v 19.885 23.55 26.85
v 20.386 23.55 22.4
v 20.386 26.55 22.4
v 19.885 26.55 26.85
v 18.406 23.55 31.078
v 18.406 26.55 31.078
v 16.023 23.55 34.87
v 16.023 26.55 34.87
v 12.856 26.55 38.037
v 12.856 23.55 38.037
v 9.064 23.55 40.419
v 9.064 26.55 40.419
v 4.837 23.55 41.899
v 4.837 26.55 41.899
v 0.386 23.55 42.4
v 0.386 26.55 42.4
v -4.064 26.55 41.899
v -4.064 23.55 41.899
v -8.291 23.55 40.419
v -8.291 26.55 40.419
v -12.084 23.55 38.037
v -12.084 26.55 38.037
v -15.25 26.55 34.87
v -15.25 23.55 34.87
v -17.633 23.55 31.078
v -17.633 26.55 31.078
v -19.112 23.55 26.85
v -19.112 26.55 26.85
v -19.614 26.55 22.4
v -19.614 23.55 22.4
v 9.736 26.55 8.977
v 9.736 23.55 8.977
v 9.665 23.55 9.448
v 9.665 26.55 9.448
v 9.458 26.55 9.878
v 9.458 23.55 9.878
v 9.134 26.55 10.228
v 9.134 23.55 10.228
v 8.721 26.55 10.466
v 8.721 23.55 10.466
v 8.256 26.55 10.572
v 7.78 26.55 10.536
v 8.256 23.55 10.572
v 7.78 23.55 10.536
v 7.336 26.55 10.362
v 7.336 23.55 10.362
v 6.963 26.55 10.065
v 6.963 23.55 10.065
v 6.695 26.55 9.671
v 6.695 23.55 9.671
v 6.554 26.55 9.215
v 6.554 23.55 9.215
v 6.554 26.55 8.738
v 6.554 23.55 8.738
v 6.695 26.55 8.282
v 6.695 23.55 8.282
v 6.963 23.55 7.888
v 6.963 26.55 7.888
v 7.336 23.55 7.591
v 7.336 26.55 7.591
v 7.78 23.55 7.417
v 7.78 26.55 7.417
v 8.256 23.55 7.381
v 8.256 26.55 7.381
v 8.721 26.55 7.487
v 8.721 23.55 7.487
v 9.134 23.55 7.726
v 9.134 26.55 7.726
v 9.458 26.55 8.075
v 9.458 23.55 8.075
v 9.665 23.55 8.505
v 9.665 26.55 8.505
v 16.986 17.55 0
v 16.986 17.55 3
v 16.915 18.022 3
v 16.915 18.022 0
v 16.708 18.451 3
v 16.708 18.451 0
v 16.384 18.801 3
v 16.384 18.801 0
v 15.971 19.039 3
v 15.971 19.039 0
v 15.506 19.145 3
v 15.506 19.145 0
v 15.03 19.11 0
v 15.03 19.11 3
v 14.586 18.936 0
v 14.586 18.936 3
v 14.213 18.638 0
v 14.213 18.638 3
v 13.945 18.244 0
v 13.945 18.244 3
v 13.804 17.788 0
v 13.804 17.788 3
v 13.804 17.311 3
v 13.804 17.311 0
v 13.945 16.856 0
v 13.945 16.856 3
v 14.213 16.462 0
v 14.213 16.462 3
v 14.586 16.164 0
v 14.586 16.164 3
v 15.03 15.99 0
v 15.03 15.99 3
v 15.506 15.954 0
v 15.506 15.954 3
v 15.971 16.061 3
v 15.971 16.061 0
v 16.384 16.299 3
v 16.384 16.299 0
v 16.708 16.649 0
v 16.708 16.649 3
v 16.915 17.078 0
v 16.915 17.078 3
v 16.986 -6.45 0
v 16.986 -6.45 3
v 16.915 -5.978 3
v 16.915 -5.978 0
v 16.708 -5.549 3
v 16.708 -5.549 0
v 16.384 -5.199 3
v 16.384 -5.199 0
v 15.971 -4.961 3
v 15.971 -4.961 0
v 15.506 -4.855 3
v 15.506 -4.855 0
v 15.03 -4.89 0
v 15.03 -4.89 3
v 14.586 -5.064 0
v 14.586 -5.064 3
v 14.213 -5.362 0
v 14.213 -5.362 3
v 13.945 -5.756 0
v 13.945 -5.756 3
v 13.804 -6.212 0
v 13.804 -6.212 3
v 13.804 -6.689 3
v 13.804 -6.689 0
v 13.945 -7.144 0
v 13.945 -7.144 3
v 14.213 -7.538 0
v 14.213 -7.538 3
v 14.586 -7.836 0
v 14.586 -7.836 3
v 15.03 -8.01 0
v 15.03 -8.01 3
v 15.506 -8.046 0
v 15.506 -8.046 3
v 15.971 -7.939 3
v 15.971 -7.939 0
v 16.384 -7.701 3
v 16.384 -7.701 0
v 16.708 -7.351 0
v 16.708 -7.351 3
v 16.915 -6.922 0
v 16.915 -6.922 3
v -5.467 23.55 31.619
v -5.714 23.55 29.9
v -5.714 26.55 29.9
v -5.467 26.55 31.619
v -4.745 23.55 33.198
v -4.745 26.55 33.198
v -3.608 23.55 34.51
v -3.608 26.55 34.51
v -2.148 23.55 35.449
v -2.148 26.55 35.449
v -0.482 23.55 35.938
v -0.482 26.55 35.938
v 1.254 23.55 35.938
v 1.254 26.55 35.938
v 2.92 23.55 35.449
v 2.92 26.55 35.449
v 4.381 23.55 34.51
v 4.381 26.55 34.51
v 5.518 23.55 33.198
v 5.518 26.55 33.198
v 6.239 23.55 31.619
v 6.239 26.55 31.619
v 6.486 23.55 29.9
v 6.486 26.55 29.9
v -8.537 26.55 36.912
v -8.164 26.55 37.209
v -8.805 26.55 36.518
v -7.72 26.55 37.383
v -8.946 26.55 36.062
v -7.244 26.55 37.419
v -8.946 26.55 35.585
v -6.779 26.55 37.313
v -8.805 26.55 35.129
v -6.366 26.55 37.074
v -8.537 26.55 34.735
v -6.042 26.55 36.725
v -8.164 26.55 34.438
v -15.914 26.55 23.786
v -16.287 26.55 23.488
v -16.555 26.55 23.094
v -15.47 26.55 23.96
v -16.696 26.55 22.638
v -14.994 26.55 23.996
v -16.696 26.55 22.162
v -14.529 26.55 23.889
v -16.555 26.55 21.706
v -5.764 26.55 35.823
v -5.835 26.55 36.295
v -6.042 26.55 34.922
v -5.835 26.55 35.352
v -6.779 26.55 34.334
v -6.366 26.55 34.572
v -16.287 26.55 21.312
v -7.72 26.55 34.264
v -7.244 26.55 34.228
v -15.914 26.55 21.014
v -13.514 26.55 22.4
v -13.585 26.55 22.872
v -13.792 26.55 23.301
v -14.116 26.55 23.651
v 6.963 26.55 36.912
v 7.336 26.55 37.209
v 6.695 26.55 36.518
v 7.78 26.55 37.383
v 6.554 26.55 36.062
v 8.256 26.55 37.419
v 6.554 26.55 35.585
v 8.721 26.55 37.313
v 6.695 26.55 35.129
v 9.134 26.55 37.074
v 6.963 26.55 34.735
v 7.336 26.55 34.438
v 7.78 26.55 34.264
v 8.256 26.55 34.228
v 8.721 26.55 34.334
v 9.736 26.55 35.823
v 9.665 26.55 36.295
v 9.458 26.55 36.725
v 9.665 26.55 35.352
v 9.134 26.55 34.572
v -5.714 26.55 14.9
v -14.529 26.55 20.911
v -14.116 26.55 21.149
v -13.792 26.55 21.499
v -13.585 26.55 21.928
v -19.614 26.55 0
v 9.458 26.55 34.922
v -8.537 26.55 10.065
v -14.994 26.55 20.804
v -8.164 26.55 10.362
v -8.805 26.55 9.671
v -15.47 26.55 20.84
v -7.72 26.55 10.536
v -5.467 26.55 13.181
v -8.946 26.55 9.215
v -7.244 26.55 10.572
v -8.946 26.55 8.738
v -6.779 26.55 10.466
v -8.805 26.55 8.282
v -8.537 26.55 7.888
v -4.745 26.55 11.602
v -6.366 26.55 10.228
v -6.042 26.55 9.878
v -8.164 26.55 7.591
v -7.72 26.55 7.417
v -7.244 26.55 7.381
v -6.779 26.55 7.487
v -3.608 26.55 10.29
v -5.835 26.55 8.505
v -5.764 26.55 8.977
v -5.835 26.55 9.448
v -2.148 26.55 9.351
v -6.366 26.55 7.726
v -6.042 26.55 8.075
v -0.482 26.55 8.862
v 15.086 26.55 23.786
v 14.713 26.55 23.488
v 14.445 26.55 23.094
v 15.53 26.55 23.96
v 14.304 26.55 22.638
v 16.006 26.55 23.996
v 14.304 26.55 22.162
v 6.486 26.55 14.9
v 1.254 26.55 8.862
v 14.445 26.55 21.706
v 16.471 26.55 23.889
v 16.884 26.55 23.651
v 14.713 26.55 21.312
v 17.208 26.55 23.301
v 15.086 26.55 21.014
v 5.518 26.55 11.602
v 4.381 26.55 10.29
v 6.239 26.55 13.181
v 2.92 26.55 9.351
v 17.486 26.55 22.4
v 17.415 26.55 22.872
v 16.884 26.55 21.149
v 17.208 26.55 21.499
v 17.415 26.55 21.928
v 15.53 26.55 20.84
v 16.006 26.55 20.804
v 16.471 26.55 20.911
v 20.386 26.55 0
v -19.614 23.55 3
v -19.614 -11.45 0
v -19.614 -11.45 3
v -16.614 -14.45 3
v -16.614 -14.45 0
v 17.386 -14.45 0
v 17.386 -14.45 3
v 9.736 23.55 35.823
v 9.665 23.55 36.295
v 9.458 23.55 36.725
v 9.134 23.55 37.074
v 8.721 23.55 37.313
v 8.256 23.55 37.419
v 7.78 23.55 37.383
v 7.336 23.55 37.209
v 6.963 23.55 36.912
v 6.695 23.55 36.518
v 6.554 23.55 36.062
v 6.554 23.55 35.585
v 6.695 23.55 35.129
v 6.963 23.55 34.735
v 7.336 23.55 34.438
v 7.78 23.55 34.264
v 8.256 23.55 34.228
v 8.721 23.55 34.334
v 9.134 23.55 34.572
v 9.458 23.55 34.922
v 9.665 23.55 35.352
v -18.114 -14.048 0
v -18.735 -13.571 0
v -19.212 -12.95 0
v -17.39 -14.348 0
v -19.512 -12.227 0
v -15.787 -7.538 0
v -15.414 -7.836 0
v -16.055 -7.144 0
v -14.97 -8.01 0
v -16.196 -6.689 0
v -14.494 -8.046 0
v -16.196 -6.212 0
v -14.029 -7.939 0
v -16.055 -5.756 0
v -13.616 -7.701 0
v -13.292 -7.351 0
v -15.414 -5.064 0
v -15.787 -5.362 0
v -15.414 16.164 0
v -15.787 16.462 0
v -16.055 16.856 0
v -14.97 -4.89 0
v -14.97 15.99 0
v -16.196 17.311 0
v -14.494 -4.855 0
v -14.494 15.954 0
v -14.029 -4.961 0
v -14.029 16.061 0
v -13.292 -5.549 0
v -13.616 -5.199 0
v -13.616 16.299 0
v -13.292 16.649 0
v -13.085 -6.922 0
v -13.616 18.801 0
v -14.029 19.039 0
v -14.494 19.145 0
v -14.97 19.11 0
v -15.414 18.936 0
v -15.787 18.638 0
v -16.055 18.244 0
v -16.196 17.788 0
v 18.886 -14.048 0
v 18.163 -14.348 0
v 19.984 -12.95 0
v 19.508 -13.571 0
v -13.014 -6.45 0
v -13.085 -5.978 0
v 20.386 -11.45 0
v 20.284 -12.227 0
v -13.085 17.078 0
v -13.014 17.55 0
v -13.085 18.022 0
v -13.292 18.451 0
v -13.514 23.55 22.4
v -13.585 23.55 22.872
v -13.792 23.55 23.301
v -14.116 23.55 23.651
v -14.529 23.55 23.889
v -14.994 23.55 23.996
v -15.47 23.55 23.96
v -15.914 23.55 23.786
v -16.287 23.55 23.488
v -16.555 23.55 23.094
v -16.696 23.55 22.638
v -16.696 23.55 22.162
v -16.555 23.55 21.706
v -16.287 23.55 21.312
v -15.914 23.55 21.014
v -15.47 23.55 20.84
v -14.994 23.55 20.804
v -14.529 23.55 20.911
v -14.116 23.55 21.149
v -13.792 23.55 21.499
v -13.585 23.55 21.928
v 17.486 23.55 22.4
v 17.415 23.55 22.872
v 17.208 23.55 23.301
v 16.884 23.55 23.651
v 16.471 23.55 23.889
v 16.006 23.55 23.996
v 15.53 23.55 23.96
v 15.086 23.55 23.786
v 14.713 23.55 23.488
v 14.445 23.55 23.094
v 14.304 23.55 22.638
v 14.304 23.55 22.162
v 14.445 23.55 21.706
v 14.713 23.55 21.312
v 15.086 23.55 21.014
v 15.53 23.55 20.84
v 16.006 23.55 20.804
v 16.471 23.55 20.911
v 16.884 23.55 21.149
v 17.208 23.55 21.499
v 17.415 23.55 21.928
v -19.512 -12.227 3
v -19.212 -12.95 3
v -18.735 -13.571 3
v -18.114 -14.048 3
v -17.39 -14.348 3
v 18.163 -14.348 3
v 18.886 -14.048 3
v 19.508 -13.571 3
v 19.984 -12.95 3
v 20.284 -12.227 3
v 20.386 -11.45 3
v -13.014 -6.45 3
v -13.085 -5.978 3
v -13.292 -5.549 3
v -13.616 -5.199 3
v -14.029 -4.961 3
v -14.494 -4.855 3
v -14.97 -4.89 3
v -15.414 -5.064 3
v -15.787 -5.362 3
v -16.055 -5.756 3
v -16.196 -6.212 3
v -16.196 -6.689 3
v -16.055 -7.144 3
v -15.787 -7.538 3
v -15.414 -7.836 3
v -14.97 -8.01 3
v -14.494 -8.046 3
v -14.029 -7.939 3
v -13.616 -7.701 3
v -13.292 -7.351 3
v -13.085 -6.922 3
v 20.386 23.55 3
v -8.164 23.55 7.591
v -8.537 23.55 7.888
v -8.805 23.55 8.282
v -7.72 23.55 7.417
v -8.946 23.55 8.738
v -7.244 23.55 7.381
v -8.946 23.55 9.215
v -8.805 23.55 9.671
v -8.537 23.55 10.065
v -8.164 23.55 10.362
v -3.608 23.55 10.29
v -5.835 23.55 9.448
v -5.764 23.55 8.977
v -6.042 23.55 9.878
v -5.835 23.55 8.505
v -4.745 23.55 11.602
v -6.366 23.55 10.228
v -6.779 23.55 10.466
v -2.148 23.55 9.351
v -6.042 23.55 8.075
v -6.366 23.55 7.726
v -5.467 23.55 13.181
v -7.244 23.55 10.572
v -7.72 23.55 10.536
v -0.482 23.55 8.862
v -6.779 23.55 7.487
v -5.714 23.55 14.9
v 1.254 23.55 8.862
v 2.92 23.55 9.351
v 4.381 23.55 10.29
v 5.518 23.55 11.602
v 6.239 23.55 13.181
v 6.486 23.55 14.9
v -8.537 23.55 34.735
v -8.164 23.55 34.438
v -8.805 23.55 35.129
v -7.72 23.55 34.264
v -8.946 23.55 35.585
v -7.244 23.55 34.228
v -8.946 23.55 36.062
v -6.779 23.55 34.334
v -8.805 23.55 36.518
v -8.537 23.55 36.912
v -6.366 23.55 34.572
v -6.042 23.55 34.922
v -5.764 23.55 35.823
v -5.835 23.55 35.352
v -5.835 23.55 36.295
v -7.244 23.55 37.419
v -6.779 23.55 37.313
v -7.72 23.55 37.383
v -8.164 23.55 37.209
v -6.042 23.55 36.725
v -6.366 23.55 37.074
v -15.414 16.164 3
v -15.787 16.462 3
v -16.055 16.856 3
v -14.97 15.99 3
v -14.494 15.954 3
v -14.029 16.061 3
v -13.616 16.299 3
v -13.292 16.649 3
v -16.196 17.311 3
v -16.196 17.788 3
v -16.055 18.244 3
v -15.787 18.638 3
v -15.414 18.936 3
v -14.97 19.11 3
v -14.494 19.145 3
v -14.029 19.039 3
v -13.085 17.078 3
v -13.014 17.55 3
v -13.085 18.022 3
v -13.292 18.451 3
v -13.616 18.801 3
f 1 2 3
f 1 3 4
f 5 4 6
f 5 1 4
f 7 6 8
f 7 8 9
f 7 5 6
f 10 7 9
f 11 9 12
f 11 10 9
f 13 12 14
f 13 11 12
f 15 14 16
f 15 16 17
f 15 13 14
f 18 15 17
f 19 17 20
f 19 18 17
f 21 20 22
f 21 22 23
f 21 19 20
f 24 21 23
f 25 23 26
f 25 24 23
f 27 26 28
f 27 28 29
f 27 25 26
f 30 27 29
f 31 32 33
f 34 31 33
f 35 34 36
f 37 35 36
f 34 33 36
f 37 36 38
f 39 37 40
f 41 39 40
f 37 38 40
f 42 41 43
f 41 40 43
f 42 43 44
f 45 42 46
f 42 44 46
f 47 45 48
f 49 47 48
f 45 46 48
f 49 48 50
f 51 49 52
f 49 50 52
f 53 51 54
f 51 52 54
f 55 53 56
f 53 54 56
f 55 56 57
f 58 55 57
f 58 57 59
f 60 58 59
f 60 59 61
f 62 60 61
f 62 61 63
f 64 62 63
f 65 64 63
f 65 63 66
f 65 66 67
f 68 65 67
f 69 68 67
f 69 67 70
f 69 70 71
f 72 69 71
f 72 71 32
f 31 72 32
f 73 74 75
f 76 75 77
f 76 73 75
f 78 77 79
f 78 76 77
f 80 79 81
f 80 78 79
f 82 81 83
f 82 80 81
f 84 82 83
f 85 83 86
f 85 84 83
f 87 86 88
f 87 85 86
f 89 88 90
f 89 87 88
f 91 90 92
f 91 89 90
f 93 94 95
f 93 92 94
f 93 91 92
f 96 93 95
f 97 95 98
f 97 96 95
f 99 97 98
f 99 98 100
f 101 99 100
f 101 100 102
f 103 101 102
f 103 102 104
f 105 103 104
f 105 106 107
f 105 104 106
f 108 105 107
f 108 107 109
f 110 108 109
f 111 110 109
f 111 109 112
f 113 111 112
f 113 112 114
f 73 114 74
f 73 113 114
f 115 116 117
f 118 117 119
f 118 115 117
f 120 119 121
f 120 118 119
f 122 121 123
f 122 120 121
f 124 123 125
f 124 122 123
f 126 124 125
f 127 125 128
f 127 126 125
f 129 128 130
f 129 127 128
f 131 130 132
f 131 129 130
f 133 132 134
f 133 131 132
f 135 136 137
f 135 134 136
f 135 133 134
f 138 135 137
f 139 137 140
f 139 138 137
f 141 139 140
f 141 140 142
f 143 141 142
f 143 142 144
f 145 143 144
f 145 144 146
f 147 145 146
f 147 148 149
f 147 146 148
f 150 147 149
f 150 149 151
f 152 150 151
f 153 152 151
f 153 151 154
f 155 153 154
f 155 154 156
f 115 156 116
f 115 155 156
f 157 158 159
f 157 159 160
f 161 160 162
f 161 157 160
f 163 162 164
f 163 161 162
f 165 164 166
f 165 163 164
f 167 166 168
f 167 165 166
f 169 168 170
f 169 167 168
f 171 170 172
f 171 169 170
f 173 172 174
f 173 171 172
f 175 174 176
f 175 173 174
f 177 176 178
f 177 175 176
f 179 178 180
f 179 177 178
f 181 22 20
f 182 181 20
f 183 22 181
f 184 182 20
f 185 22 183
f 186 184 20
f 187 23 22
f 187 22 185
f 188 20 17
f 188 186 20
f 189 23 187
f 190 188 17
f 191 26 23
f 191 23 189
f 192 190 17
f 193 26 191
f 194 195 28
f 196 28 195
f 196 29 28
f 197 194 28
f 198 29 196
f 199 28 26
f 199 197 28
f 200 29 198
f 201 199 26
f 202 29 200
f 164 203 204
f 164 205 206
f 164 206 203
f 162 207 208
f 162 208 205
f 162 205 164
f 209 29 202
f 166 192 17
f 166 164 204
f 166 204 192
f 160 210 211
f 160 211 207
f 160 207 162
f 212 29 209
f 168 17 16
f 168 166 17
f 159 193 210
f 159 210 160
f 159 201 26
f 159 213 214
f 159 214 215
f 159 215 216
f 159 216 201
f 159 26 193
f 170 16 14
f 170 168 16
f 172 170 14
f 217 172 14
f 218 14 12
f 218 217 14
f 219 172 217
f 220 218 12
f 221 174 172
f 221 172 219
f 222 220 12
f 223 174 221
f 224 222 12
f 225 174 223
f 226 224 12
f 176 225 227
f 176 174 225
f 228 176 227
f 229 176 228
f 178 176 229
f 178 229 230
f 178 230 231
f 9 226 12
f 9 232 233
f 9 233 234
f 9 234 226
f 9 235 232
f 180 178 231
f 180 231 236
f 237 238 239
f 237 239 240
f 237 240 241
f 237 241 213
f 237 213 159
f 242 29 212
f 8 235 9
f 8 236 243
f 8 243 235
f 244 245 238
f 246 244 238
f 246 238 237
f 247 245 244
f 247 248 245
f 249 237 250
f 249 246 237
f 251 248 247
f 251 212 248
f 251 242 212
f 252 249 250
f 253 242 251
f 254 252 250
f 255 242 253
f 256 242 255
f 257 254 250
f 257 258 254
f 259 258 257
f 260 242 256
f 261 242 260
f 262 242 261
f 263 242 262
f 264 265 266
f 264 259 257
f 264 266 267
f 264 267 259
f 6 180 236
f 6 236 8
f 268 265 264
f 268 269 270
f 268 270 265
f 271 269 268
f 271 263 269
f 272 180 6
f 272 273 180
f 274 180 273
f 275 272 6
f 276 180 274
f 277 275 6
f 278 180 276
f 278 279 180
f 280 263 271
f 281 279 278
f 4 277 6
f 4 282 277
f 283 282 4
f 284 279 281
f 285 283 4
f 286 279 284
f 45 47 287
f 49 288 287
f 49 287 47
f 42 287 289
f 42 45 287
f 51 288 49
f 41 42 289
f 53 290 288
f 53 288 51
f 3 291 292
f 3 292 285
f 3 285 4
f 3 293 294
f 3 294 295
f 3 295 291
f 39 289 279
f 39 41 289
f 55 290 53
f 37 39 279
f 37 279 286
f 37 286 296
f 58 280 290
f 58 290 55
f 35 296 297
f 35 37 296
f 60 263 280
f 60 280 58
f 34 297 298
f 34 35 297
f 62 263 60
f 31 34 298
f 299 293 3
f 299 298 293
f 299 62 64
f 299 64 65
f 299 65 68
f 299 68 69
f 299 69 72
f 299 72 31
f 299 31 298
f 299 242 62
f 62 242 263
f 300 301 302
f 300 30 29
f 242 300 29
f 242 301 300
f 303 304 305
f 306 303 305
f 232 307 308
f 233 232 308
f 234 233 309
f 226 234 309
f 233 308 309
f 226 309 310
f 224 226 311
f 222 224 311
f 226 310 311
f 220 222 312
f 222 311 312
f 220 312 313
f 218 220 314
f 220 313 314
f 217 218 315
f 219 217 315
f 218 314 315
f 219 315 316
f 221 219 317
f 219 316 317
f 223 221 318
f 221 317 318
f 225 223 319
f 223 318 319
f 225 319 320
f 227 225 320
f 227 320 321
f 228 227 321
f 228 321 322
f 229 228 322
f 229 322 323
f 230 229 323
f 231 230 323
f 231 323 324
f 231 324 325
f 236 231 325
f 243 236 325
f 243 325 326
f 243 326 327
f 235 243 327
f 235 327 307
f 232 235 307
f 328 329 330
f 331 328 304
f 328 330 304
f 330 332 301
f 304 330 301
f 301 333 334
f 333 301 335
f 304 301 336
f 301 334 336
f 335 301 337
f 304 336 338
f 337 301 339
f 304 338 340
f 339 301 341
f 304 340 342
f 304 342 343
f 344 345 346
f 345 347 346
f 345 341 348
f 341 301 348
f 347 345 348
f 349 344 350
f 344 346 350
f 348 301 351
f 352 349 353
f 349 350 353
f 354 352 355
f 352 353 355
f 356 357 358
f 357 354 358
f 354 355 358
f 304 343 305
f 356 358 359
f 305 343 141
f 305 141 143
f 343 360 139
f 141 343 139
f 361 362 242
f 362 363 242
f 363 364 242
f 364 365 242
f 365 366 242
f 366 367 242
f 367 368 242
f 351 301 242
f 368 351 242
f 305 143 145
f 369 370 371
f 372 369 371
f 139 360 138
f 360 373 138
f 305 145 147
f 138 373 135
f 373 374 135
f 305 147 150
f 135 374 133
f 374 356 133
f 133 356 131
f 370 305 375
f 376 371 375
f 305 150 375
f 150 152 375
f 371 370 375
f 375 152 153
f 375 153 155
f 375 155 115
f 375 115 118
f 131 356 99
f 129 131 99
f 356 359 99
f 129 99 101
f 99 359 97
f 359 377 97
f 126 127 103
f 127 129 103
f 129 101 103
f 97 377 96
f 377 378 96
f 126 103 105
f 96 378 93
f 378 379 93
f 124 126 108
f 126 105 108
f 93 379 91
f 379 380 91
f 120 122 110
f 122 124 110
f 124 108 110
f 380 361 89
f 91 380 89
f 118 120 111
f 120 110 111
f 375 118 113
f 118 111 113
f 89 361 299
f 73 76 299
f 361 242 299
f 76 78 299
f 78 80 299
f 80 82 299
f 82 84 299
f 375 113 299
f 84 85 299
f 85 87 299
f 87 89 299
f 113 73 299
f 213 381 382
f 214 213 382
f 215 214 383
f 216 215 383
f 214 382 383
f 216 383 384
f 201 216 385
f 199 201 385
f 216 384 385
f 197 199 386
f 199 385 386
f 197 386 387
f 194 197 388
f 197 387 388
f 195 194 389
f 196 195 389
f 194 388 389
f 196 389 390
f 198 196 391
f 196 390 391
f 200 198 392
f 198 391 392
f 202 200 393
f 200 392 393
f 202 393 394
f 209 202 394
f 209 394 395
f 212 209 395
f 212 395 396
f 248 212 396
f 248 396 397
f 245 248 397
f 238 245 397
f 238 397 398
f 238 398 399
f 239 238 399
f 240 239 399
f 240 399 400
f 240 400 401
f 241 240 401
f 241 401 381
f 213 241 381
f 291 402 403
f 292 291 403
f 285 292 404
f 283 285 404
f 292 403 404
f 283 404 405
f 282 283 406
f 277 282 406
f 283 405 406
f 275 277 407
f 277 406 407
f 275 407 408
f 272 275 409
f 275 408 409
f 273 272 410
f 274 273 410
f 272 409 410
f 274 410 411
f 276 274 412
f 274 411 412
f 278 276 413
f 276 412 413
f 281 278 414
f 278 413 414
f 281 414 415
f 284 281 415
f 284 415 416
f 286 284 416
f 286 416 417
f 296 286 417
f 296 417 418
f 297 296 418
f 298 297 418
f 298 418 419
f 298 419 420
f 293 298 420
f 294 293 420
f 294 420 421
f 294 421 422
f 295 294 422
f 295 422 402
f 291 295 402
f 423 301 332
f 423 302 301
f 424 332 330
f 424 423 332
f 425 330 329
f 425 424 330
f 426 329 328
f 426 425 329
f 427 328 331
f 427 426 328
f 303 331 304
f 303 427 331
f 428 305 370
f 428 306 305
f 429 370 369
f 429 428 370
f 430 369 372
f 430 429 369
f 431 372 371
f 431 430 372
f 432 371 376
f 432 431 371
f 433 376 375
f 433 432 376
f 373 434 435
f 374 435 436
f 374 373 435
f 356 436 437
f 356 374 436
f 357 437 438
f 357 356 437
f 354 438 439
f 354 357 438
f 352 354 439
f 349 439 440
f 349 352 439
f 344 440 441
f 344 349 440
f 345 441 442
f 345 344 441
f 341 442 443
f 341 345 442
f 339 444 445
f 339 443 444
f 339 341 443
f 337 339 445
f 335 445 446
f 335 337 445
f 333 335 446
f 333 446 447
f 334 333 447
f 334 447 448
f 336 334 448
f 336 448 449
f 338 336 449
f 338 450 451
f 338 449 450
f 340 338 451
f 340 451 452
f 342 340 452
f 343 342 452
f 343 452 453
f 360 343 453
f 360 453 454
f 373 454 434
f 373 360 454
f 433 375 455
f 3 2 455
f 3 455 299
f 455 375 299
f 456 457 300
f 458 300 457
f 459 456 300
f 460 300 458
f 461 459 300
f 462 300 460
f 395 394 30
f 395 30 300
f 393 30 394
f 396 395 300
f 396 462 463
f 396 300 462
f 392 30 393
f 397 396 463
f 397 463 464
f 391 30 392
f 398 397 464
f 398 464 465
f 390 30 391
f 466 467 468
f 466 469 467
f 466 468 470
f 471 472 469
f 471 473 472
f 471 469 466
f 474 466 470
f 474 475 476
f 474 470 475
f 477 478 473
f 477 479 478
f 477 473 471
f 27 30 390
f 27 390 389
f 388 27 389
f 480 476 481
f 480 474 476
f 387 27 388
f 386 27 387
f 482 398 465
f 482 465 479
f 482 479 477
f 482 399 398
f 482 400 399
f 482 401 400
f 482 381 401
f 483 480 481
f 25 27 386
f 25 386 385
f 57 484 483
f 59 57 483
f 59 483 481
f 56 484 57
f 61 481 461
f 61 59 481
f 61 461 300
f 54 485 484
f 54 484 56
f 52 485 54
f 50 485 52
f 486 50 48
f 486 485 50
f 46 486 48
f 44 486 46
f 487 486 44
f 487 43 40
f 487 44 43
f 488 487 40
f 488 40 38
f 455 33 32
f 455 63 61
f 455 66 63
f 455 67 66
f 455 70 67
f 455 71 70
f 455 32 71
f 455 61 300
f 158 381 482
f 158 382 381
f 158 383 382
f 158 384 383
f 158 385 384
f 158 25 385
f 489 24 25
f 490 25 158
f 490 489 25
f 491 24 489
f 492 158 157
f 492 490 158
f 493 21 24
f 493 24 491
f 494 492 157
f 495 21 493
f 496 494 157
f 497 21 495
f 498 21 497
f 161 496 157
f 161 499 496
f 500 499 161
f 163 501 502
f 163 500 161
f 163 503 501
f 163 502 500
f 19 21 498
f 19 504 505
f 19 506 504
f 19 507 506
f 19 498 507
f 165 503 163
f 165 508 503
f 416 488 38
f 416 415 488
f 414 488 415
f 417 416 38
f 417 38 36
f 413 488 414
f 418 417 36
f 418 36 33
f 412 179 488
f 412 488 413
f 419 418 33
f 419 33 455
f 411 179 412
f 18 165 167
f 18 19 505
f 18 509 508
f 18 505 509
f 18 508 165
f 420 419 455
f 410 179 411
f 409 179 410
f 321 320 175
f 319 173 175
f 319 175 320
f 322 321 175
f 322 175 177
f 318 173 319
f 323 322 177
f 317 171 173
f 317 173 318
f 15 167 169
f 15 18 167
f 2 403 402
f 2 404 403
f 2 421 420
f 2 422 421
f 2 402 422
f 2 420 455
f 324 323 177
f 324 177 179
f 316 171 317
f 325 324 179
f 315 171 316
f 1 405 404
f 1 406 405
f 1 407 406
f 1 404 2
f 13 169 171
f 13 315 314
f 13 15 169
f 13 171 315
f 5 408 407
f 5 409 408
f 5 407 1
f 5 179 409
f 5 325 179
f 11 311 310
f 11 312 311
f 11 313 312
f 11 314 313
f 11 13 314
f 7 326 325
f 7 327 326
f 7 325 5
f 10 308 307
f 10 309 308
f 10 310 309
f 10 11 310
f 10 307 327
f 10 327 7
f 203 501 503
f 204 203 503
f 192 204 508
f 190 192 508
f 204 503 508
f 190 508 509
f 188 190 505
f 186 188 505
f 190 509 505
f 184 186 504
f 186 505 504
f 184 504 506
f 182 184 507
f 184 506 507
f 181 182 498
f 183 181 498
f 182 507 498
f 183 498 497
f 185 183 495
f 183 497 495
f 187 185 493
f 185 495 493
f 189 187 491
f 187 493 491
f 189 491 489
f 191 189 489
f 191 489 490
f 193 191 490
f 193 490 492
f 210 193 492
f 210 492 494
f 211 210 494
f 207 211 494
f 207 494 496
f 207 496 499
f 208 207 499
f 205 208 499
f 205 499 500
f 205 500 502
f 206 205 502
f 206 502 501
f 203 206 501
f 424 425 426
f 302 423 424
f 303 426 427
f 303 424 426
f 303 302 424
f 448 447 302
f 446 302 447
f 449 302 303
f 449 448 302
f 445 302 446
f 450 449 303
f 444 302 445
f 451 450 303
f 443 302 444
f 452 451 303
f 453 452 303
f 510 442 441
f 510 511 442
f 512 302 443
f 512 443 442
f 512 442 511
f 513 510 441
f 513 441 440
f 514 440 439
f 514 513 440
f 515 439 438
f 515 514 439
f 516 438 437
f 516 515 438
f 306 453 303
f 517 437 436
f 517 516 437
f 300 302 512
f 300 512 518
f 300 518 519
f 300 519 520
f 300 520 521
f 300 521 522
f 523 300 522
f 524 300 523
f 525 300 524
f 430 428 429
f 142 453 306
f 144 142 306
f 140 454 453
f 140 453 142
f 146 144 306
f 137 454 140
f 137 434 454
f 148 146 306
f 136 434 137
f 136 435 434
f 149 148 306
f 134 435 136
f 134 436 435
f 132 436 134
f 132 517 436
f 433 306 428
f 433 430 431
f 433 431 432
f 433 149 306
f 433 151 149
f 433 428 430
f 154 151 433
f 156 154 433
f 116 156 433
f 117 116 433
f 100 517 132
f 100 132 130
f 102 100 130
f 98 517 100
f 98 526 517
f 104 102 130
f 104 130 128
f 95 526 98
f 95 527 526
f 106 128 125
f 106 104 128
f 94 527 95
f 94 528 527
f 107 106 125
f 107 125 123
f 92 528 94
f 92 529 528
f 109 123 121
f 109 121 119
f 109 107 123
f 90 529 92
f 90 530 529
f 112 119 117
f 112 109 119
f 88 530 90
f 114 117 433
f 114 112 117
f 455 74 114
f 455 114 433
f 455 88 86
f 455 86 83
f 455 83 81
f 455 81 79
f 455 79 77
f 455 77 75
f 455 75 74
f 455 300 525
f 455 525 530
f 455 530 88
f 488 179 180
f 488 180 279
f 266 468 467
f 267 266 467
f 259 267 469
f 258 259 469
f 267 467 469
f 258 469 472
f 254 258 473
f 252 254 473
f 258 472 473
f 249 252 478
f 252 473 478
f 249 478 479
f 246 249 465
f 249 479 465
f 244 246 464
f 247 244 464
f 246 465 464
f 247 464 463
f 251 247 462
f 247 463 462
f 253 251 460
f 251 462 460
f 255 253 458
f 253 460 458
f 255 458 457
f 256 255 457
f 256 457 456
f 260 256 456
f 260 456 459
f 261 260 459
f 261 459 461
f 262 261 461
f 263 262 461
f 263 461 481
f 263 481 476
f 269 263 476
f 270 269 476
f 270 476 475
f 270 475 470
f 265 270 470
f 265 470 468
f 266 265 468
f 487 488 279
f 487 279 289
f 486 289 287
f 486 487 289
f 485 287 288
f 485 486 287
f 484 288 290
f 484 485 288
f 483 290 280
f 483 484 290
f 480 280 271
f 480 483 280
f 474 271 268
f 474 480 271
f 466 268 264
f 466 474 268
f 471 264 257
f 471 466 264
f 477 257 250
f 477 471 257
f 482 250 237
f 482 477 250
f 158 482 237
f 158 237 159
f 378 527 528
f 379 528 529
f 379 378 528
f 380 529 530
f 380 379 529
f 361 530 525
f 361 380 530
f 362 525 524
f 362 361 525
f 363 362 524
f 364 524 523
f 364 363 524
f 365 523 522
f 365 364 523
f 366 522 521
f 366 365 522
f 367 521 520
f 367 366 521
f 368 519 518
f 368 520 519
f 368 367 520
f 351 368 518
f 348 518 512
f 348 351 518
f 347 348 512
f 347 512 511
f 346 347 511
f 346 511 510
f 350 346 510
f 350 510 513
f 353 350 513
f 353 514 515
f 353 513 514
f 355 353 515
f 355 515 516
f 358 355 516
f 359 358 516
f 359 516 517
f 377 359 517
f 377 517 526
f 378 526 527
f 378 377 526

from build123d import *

# Parameters (mm, degrees)
SKETCH_2_W          = 40
SKETCH_2_H          = 41
SKETCH_2_R          = 1.6
EXTRUDE_1_DEPTH     = 44.2
SKETCH_3_W          = 40
SKETCH_3_H          = 38
CUT_EXTRUDE_1_DEPTH = 41.2
FILLET_1_R          = 3
SKETCH_4_R          = 1.6
CUT_EXTRUDE_2_DEPTH = 10


with BuildPart() as part:
    # 草图2 → 凸台-拉伸1 (new body)
    with BuildSketch(Plane.XY):
        with Locations((0.386252919, 6.049930002)):
            Rectangle(SKETCH_2_W, SKETCH_2_H)
        with Locations((-14.613747081, -6.450069998)):
            Circle(SKETCH_2_R, mode=Mode.SUBTRACT)
        with Locations((15.386252919, -6.450069998)):
            Circle(SKETCH_2_R, mode=Mode.SUBTRACT)
        with Locations((-14.613747081, 17.549930002)):
            Circle(SKETCH_2_R, mode=Mode.SUBTRACT)
        with Locations((15.386252919, 17.549930002)):
            Circle(SKETCH_2_R, mode=Mode.SUBTRACT)
    extrude(amount=EXTRUDE_1_DEPTH)

    # 草图3 → 切除-拉伸1 (cut)
    with BuildSketch(Plane.XY.offset(44.2)):
        with Locations((0.386252919, 4.549930002)):
            Rectangle(SKETCH_3_W, SKETCH_3_H)
    extrude(amount=-CUT_EXTRUDE_1_DEPTH, mode=Mode.SUBTRACT)

    # 圆角1
    fillet_1_edges = [part.edges().sort_by_distance(p)[0] for p in [
        (20.386252919, -14.450069998, 1.5),
        (-19.613747081, -14.450069998, 1.5),
    ]]
    fillet(fillet_1_edges, radius=FILLET_1_R)

    # 草图4 → 切除-拉伸2 (cut)
    with BuildSketch(Plane.XZ.offset(-23.549930002)):
        with Locations((-7.363747081, 35.823393759)):
            Circle(SKETCH_4_R)
        with Locations((8.136252919, 35.823393759)):
            Circle(SKETCH_4_R)
        with Locations((15.886252919, 22.4)):
            Circle(SKETCH_4_R)
        with Locations((8.136252919, 8.976606241)):
            Circle(SKETCH_4_R)
        with Locations((-7.363747081, 8.976606241)):
            Circle(SKETCH_4_R)
        with Locations((-15.113747081, 22.4)):
            Circle(SKETCH_4_R)
        with BuildLine():
            Line((-19.613747081, 44.2), (20.386252919, 44.2))
            Line((20.386252919, 44.2), (20.386252919, 22.4))
            ThreePointArc((20.386252919, 22.4), (0.386252919, 42.4), (-19.613747081, 22.4))
            Line((-19.613747081, 22.4), (-19.613747081, 44.2))
        make_face()
        with BuildLine():
            Line((-5.713747081, 14.9), (-5.713747081, 29.9))
            ThreePointArc((-5.713747081, 29.9), (0.386252919, 36), (6.486252919, 29.9))
            Line((6.486252919, 29.9), (6.486252919, 14.9))
            ThreePointArc((6.486252919, 14.9), (0.386252919, 8.8), (-5.713747081, 14.9))
        make_face()
    extrude(amount=-CUT_EXTRUDE_2_DEPTH, mode=Mode.SUBTRACT)


solid = part.part
